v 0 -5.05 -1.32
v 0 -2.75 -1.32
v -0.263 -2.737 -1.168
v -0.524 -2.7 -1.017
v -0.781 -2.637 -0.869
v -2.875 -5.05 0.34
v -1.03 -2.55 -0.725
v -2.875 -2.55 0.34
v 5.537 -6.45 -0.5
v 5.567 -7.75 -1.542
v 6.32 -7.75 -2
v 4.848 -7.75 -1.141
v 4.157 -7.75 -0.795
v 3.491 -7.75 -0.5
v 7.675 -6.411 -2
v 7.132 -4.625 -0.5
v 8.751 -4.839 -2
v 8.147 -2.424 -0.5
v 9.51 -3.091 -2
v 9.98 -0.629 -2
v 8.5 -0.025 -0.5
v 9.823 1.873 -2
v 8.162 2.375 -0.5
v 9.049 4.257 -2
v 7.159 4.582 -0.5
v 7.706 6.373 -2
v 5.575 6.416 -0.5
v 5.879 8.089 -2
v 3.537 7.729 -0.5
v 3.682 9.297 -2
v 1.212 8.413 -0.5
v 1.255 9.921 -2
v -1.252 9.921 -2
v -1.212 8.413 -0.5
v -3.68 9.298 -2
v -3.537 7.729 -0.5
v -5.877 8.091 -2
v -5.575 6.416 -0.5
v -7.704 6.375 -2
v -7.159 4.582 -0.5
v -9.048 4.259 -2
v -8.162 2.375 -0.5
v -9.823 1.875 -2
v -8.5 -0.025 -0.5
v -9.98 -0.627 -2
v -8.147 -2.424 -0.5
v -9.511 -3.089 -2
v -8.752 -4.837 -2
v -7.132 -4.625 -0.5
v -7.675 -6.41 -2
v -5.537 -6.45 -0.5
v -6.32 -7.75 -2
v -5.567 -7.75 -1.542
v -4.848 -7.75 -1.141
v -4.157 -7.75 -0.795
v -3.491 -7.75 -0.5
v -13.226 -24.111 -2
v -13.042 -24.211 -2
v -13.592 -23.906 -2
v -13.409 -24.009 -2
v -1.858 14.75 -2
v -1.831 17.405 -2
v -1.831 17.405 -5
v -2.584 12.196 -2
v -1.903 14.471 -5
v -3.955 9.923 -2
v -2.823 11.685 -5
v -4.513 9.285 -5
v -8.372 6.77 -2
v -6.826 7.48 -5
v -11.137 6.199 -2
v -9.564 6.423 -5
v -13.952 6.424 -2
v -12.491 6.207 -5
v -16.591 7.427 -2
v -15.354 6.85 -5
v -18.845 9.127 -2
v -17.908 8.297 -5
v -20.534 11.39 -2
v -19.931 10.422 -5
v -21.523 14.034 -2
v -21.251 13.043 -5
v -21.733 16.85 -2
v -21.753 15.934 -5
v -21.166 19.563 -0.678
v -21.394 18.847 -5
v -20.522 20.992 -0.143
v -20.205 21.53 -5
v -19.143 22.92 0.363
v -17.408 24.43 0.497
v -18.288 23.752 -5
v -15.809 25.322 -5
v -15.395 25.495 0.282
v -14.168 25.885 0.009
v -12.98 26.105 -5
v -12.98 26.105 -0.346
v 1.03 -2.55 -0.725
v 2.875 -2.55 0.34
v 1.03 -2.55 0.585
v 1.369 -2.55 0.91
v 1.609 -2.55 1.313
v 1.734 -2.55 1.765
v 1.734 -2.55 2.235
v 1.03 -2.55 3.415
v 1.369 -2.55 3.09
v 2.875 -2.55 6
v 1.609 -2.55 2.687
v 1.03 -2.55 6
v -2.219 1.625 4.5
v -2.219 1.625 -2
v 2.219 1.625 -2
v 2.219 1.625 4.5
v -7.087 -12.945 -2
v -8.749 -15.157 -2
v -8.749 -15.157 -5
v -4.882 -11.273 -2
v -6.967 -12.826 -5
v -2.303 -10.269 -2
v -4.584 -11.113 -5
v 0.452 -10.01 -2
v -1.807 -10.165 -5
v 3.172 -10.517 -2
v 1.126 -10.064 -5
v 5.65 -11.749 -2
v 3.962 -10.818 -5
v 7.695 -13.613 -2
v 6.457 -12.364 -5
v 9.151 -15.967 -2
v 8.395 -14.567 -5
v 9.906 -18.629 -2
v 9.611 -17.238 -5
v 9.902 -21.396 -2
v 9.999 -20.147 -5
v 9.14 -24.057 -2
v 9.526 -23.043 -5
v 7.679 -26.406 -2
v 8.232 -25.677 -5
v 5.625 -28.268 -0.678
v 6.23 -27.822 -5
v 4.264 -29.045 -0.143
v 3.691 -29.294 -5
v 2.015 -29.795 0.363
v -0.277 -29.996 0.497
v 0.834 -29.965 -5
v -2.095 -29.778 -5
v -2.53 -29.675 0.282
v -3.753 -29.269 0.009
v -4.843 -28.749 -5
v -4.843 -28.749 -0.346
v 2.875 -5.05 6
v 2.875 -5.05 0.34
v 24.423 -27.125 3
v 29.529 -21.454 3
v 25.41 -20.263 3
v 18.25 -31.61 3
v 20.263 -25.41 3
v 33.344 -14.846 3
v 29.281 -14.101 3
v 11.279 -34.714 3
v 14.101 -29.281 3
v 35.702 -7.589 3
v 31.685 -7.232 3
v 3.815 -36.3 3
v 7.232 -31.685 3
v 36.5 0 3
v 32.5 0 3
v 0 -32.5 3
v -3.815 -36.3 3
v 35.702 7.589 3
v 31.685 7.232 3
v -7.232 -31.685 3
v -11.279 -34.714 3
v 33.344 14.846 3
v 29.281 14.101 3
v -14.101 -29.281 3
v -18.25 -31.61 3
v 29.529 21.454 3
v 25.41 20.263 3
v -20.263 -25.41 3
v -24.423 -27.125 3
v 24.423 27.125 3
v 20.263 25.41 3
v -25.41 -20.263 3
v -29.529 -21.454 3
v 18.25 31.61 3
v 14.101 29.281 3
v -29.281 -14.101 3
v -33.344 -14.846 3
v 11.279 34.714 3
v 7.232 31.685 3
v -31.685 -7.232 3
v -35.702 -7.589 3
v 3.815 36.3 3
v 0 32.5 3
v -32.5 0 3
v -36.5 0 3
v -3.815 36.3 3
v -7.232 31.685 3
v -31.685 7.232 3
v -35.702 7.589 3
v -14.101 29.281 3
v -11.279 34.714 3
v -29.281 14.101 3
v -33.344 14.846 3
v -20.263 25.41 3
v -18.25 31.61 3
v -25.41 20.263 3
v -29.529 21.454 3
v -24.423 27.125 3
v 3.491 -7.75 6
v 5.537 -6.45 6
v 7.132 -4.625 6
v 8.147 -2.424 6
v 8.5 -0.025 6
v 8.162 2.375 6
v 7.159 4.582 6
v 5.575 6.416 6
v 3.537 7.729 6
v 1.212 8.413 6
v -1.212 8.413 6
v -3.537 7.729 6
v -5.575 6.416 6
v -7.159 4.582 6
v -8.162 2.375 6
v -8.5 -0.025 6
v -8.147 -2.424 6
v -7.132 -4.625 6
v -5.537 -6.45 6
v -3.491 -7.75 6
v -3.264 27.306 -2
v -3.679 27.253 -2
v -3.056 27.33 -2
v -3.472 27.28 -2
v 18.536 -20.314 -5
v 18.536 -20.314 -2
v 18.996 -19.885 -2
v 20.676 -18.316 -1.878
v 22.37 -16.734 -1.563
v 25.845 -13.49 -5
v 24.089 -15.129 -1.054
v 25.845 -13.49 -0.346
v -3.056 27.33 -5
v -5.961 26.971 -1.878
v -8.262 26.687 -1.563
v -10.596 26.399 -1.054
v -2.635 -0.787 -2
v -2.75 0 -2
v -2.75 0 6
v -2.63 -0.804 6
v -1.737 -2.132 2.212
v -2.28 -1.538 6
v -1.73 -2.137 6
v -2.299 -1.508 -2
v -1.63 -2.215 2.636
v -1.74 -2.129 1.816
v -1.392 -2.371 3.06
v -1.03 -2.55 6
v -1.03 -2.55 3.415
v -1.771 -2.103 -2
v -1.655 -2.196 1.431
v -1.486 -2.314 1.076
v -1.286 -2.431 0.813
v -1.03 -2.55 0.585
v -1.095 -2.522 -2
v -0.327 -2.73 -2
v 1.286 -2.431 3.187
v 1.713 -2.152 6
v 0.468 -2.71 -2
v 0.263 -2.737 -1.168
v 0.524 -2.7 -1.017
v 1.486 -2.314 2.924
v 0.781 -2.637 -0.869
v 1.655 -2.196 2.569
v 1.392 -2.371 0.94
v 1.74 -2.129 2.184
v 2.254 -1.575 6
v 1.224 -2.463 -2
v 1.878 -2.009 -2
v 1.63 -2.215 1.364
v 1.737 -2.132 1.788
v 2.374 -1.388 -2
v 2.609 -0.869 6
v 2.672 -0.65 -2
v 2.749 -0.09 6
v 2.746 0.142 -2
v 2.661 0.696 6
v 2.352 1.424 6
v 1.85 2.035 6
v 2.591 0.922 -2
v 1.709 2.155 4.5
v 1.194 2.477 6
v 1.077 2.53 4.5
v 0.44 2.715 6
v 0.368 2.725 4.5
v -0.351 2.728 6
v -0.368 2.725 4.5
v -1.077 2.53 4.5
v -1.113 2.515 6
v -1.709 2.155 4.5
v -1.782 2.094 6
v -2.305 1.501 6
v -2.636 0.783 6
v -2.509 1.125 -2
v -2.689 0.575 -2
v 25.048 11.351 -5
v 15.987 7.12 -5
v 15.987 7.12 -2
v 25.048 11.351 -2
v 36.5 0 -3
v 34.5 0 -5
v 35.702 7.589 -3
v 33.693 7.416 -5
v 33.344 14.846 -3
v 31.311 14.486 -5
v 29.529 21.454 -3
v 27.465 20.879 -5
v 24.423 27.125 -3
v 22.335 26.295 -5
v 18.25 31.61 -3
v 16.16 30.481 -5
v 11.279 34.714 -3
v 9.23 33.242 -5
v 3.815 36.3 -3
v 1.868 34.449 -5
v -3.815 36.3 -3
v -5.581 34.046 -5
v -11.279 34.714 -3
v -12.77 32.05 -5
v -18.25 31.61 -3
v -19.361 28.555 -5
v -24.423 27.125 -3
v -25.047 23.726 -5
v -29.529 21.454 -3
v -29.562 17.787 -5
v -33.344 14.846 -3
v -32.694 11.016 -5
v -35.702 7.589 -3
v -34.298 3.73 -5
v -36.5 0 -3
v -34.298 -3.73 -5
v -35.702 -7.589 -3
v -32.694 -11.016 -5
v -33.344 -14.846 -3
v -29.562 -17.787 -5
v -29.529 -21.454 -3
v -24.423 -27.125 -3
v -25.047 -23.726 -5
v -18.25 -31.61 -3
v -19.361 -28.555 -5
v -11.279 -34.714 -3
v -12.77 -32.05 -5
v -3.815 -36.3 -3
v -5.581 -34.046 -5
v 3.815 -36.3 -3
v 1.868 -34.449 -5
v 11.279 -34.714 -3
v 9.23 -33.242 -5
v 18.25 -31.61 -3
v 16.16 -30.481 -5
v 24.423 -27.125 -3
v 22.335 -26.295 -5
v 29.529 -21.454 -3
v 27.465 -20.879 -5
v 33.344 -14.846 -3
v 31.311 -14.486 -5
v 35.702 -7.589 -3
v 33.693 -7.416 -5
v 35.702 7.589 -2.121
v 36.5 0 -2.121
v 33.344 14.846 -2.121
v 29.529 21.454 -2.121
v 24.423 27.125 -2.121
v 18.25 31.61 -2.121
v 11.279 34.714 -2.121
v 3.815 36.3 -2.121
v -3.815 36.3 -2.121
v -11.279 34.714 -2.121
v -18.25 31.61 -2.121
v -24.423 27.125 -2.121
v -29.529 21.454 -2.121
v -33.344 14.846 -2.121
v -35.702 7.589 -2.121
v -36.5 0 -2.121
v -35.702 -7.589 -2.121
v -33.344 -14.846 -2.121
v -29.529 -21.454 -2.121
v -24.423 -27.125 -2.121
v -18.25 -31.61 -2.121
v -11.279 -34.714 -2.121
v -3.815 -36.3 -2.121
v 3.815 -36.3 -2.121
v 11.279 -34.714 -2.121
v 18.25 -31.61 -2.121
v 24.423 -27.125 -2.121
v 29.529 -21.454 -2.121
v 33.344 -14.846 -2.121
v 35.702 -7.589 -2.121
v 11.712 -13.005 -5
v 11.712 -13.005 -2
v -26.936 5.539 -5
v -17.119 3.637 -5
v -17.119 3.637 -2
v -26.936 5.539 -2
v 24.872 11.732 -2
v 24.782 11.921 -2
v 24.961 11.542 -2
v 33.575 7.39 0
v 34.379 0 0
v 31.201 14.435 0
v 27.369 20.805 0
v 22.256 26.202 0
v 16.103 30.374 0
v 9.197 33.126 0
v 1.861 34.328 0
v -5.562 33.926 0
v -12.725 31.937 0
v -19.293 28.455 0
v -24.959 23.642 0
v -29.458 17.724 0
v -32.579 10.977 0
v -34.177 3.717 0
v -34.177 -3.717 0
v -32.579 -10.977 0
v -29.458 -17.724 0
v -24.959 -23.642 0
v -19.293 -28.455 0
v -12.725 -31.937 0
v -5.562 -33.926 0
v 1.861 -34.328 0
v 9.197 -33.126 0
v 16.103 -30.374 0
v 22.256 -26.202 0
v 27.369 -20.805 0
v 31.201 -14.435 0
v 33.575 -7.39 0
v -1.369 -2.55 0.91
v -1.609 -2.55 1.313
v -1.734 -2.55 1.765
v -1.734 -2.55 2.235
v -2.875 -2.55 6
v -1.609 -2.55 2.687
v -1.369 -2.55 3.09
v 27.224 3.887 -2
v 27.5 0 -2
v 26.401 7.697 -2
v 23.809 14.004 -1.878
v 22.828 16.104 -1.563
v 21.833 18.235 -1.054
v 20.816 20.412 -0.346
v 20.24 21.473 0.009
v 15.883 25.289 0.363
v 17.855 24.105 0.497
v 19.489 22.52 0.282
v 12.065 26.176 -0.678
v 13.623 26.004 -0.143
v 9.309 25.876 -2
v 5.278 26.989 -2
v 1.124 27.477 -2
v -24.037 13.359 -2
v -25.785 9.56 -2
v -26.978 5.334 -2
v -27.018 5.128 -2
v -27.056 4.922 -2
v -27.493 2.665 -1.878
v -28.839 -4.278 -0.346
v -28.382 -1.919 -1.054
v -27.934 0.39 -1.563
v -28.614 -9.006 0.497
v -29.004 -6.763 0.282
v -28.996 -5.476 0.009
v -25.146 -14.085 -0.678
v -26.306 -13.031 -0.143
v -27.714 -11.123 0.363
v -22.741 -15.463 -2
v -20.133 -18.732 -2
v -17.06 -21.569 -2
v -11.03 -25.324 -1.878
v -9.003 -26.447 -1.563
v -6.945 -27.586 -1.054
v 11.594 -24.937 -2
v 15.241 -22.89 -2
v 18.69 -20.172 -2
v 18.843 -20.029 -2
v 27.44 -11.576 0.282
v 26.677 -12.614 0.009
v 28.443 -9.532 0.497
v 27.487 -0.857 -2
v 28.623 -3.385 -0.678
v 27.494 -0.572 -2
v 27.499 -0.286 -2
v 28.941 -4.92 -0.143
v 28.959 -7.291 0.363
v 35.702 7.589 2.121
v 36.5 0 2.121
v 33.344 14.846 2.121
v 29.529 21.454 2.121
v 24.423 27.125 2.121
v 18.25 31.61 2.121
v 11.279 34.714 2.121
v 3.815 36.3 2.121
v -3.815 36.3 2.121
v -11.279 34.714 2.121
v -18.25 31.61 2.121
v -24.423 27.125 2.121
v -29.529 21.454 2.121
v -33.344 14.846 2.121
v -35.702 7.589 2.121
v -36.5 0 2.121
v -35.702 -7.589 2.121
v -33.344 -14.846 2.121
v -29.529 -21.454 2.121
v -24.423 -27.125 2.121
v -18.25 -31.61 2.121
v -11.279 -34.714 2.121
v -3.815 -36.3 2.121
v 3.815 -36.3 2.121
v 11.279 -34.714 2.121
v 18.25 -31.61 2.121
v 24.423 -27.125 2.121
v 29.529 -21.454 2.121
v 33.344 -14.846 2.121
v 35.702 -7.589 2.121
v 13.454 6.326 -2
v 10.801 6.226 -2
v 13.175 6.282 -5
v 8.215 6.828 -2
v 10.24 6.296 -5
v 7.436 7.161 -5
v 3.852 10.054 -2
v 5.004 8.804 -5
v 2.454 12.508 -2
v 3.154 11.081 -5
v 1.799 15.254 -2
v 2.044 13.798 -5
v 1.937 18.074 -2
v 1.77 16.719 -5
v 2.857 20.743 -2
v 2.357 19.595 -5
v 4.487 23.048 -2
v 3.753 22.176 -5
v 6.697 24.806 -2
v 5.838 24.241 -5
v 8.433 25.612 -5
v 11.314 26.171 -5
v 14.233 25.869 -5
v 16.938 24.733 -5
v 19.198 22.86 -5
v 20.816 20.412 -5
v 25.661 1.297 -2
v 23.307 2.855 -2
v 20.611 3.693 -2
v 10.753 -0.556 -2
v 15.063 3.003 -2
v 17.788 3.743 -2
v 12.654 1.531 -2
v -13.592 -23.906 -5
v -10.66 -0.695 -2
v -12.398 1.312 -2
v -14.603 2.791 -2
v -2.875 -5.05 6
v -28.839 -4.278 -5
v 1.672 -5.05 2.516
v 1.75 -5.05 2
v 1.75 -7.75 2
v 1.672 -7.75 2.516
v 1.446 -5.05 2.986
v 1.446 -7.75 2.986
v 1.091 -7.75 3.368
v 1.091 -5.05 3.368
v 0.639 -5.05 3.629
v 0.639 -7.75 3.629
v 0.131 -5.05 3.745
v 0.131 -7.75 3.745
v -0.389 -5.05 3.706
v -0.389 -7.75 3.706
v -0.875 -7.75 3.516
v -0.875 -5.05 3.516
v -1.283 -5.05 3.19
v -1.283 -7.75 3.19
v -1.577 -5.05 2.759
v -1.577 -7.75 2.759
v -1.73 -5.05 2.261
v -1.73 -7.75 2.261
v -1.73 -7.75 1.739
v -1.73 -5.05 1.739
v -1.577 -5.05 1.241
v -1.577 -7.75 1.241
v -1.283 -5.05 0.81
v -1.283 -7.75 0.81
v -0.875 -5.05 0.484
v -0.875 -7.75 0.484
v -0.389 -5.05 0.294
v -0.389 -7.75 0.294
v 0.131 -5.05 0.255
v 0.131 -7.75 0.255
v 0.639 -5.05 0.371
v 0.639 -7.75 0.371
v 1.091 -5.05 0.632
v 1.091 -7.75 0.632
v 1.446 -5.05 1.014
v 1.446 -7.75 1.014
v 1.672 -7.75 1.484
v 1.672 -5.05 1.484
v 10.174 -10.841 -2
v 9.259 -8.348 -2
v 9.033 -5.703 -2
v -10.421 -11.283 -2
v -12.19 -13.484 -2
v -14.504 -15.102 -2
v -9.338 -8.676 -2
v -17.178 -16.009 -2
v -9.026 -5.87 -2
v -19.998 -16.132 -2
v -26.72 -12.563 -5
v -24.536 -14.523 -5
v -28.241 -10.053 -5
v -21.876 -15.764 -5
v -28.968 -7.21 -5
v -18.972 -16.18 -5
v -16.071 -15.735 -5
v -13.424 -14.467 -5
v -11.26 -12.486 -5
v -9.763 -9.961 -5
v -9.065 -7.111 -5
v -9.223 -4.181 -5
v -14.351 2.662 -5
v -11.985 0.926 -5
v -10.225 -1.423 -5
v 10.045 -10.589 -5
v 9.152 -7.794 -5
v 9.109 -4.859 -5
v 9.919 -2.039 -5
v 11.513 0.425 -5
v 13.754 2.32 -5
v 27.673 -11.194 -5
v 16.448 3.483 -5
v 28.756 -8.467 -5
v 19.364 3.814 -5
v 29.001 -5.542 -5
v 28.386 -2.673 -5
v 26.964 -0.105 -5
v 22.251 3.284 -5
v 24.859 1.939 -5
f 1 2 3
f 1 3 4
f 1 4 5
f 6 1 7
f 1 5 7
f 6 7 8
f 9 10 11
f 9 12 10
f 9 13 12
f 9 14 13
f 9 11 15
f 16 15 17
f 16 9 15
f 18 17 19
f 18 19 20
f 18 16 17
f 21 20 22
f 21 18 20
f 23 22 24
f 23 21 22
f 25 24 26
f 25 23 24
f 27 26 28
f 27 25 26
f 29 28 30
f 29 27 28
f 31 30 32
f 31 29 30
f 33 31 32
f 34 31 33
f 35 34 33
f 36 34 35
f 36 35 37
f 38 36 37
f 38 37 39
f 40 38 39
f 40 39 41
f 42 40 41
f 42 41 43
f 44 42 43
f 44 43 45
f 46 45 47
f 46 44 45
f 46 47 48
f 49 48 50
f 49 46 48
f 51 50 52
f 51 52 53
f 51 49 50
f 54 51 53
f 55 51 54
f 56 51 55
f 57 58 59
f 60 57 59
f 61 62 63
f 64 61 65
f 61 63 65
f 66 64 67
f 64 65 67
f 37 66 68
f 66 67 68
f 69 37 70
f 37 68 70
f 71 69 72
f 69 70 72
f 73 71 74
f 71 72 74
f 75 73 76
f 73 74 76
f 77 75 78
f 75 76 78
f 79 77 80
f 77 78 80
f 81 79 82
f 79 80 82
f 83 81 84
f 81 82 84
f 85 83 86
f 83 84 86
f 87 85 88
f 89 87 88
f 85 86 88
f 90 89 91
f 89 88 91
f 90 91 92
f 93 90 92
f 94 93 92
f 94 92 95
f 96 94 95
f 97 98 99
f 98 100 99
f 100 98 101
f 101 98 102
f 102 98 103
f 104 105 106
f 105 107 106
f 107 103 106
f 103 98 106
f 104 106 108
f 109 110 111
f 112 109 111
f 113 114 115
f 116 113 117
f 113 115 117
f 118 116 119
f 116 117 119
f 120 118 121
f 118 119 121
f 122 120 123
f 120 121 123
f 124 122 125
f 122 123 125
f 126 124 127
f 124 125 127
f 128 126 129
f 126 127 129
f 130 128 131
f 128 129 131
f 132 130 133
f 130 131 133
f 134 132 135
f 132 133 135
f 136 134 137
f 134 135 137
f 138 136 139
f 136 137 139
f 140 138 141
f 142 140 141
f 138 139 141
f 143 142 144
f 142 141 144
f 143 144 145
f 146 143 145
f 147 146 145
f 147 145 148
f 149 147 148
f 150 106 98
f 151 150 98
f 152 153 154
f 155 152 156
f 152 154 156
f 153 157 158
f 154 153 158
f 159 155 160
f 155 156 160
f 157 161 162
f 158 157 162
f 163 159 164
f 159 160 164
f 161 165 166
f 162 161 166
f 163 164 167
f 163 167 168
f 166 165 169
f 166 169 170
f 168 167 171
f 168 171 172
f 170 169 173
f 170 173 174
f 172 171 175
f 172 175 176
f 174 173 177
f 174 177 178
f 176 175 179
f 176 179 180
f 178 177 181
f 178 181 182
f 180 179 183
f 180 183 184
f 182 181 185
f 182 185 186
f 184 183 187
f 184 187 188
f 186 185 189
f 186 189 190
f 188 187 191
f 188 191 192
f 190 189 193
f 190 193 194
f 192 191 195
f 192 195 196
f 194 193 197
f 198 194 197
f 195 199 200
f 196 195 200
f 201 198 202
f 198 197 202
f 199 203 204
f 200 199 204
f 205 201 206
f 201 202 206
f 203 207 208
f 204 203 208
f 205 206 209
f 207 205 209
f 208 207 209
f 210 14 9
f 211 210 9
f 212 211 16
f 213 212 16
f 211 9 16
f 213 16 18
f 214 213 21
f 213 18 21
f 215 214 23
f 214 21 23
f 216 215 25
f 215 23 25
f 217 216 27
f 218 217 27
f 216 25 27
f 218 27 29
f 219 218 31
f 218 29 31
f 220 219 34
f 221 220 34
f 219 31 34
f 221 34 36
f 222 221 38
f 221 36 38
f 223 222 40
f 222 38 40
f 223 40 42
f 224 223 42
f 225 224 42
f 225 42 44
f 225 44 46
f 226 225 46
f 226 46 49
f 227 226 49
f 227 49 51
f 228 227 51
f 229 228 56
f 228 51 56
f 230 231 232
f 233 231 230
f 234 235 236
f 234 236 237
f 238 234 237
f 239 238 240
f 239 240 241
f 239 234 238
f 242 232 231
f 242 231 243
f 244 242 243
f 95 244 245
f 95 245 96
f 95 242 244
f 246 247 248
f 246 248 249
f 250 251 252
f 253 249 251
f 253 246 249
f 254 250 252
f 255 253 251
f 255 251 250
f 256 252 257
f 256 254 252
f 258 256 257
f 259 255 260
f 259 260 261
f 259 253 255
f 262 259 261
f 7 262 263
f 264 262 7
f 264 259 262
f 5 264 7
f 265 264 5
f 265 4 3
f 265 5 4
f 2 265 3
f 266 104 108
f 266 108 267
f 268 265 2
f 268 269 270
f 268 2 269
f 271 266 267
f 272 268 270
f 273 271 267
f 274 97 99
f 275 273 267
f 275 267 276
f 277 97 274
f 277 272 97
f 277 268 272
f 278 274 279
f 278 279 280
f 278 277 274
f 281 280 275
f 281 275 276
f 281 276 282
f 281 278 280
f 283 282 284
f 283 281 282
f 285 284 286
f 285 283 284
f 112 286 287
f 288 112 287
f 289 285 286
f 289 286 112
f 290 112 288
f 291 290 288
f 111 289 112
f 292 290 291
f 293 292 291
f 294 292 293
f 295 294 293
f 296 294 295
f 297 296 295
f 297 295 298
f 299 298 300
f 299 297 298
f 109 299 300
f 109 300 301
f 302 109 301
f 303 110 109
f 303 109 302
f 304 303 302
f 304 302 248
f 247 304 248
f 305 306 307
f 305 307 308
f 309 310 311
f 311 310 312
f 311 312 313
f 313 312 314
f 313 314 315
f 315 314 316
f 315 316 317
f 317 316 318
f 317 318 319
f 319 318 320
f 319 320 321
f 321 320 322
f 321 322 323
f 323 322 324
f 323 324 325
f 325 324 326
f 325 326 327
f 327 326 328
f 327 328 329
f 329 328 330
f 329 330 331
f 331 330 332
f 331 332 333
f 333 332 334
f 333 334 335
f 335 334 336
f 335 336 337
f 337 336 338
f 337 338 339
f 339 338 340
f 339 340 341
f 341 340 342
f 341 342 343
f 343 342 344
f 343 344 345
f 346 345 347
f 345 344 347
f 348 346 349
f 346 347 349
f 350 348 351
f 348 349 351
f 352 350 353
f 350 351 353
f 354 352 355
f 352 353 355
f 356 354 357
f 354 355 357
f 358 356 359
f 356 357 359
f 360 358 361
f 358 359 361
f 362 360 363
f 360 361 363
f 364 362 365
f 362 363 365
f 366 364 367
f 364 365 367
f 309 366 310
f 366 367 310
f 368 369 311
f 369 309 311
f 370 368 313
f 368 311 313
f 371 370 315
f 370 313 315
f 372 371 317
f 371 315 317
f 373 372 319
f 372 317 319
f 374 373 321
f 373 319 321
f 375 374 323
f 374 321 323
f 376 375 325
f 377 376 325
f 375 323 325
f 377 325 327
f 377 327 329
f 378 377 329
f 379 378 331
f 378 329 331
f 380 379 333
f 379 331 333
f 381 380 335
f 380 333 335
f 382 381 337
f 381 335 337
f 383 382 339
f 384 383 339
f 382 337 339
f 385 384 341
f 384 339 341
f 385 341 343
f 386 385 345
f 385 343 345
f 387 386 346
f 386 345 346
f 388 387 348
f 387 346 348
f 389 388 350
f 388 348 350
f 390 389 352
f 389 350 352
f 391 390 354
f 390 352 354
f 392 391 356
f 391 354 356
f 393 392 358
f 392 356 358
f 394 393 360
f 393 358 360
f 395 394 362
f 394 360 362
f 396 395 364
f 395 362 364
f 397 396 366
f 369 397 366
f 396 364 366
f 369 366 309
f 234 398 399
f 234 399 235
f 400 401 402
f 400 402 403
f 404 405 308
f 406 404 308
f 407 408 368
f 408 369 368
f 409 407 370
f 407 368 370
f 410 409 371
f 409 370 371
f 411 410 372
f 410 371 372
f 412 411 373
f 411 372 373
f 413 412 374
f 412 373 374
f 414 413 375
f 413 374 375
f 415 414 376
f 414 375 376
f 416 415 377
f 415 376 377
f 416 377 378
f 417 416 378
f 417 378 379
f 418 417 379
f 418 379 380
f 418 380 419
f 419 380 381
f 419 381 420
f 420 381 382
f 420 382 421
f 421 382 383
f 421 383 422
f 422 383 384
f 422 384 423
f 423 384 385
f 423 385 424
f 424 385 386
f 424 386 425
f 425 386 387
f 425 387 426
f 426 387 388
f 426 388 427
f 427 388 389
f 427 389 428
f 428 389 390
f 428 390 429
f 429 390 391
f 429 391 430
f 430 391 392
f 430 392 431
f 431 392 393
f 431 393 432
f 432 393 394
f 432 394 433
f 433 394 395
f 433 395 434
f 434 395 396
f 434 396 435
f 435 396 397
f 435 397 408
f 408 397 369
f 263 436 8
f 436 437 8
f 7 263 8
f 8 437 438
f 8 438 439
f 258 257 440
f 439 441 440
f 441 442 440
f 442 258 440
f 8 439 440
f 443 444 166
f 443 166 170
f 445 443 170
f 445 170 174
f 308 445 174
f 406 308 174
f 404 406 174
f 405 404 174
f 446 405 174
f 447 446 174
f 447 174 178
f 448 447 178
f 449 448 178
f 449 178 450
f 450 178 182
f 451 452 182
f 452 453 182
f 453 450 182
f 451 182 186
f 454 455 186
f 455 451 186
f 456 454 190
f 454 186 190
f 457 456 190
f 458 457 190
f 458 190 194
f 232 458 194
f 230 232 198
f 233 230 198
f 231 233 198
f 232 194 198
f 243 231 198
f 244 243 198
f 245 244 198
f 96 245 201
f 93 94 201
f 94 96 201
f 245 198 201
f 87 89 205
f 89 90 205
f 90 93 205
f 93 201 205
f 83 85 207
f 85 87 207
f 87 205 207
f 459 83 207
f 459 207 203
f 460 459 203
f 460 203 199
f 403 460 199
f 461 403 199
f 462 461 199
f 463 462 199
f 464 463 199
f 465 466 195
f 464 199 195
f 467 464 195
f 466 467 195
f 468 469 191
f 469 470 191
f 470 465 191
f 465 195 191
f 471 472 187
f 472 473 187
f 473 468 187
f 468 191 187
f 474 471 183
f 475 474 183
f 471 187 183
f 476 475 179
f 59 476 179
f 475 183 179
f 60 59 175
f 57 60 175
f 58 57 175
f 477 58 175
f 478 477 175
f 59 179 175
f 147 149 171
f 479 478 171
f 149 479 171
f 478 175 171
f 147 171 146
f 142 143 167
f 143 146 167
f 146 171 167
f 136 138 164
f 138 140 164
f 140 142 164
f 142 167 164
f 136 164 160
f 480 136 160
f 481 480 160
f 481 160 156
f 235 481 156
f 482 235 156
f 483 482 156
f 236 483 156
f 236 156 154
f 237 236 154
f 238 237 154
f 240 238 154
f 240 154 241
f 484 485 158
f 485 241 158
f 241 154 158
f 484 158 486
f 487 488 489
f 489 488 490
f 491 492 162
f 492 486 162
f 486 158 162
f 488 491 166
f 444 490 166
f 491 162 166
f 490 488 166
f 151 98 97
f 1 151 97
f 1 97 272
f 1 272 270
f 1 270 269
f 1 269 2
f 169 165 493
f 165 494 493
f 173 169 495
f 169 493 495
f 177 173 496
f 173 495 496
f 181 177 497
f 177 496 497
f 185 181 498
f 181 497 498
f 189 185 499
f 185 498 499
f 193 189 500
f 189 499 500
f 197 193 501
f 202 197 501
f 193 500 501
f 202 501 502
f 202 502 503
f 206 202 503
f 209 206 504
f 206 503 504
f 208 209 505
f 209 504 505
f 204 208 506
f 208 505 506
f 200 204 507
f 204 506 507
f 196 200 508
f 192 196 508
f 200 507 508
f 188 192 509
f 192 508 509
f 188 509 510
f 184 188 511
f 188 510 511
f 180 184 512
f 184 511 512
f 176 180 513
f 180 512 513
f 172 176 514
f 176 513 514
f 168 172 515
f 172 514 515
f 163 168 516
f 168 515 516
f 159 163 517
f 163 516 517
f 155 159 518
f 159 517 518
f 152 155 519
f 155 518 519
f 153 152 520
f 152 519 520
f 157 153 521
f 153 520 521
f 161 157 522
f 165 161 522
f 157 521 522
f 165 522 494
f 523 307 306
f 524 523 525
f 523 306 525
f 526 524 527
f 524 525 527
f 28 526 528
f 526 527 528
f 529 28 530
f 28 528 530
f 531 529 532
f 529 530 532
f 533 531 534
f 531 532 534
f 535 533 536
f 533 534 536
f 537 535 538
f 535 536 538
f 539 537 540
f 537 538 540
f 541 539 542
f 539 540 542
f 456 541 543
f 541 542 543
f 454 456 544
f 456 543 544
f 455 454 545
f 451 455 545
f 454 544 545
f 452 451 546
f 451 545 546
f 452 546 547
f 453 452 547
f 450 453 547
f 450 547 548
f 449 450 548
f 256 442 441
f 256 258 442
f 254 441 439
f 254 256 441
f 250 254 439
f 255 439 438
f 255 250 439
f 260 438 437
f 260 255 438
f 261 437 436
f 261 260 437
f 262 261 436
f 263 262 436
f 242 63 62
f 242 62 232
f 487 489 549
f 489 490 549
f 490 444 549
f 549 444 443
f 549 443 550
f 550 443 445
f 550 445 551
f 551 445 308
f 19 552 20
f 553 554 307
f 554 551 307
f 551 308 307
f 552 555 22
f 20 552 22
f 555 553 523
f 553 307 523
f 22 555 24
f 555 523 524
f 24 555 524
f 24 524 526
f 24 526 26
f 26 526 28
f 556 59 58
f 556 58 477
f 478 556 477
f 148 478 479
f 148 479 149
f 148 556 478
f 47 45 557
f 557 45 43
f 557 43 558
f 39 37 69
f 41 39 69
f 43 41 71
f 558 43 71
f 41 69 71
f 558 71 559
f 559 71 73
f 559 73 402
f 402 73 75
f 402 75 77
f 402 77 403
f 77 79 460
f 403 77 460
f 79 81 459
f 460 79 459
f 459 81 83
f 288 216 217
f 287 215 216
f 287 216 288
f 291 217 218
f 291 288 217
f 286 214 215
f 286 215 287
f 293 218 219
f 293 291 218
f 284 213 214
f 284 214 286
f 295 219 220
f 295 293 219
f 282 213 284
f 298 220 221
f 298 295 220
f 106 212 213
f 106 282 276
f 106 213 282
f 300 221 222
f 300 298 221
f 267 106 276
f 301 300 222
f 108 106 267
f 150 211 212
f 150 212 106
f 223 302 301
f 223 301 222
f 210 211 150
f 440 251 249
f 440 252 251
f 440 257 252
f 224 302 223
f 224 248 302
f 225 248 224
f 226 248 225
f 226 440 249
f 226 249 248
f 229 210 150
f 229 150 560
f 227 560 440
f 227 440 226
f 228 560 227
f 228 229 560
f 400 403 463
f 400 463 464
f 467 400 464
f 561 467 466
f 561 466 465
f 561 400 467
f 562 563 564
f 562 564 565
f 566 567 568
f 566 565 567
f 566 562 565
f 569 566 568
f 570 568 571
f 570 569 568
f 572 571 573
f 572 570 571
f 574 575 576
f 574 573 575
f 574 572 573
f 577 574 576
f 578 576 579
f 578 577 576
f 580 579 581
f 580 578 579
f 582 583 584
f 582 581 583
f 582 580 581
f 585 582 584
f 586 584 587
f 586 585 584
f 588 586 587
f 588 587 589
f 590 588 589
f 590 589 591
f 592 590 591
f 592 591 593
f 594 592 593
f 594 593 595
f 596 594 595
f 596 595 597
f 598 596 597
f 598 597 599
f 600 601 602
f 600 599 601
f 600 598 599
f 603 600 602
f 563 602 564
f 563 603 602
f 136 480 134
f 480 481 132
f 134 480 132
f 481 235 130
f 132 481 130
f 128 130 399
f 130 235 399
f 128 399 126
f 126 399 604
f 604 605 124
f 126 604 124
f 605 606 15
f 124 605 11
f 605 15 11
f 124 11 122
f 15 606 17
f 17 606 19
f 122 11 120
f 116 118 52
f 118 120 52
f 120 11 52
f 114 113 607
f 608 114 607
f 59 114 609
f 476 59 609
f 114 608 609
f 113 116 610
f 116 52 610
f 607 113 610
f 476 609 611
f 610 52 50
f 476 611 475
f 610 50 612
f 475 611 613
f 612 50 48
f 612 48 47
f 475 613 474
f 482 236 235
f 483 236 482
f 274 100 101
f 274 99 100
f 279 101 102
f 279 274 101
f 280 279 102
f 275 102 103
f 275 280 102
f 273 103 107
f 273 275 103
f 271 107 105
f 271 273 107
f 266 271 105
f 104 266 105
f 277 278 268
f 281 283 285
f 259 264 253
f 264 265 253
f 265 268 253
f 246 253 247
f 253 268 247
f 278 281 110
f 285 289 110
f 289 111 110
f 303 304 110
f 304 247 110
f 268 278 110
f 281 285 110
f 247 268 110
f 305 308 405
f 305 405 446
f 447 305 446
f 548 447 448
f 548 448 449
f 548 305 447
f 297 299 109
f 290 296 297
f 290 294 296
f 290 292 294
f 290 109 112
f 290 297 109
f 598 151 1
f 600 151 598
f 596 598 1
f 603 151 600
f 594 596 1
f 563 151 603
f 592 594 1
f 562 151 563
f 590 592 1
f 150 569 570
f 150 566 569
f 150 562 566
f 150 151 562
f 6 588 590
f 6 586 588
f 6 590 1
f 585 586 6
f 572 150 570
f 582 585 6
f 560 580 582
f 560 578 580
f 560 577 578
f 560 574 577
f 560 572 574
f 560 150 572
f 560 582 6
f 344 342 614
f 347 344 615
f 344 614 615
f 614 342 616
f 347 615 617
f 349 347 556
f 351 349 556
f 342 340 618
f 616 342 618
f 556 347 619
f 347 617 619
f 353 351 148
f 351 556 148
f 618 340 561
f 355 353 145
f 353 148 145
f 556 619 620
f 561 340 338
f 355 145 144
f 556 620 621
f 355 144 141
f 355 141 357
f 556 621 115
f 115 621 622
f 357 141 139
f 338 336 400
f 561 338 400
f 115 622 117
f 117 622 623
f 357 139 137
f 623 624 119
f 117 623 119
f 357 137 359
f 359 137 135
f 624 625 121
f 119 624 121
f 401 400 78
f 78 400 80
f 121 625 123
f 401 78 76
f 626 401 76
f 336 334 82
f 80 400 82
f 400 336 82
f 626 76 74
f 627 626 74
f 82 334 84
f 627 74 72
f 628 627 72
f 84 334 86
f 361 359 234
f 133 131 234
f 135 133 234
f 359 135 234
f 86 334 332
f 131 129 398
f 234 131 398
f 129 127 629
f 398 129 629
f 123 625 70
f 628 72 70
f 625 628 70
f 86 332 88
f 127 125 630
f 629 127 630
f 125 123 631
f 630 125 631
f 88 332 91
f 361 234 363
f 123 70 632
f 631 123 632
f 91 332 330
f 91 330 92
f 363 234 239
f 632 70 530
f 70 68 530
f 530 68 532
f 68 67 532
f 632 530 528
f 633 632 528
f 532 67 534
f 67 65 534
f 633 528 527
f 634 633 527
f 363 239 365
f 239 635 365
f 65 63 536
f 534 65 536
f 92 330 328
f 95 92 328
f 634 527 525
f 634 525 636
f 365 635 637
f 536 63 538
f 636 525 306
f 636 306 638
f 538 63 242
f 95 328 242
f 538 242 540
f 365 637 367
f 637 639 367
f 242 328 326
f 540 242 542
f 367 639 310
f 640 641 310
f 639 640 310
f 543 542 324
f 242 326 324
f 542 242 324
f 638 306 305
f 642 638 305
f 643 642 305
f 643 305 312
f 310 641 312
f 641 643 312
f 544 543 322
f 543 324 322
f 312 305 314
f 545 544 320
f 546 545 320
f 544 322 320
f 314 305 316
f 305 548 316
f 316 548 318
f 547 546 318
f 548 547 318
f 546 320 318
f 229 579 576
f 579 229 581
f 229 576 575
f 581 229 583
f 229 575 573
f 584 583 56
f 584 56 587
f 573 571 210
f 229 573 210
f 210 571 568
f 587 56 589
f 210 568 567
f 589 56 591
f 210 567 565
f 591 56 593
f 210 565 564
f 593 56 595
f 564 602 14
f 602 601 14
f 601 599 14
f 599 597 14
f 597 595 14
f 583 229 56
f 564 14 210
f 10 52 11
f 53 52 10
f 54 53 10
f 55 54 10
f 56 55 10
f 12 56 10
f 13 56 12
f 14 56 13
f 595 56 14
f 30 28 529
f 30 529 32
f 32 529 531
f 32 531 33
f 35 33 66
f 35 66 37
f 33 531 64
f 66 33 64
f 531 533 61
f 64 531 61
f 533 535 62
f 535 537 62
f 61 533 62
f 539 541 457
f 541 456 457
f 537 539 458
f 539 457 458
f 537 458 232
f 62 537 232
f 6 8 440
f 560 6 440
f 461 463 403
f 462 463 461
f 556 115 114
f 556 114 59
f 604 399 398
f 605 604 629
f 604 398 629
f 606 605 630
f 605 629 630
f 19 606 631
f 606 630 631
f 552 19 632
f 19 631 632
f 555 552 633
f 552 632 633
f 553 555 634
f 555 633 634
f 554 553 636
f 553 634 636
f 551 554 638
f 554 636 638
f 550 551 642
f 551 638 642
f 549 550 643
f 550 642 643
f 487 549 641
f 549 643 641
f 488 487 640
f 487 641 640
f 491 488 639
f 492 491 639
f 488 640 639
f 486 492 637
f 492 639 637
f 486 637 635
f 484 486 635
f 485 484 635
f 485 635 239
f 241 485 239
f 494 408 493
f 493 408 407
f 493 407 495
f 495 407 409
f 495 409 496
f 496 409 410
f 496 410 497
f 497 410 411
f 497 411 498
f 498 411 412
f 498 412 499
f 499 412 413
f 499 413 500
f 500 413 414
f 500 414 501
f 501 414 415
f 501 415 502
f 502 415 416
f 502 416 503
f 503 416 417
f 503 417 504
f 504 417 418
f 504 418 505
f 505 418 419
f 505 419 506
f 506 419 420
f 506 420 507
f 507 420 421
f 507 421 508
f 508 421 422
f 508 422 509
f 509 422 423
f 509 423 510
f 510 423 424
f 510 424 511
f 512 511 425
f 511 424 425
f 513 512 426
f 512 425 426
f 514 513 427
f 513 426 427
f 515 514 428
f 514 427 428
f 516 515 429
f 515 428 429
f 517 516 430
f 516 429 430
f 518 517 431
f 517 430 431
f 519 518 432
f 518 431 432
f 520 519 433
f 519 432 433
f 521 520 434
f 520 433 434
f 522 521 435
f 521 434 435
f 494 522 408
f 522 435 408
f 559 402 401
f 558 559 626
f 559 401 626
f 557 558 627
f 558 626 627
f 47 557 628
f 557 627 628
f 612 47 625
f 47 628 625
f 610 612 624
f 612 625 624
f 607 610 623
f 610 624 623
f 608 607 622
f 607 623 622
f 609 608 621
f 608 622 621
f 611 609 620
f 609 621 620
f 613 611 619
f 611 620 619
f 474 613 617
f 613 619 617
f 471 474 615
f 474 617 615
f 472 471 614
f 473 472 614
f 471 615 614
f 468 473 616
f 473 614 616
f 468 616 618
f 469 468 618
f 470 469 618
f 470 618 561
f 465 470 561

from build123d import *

# Parameters (mm, degrees)
PAD_DEPTH              = 2.5
CYLINDER001_R          = 1.75
CYLINDER001_DEPTH      = 10
CYLINDER001_ROLL_ANGLE = 90
BOX_W                  = 6
BOX_H                  = 3
BOX_DEPTH              = 7.5
SKETCH003_R            = 2.75
PAD001_DEPTH           = 8
CHAMFER_SIZE           = 1.5
POCKET_DEPTH           = 218.644926
POLARPATTERN_COUNT     = 5


with BuildPart() as captive_nut:
    # Sketch002 → Pad (new body)
    with BuildSketch(Plane.XZ):
        Polygon((-2.875, 5), (2.875, 5), (2.875, -1.659882), (0, -3.319764), (-2.875, -1.659882), align=None)
    extrude(amount=PAD_DEPTH)


with BuildPart() as captive_nut_1:
    # Clone placement: moved
    add(captive_nut.part.moved(Location((0, -3.75, 2))))


with BuildPart() as captive_nut_screw_fusion:
    # Cylinder001 → Cylinder001 (new body)
    with BuildSketch(Plane.XY):
        Circle(CYLINDER001_R)
    extrude(amount=CYLINDER001_DEPTH)


with BuildPart() as captive_nut_screw_fusion_1:
    # Cylinder001 roll: moved
    add(captive_nut_screw_fusion.part.rotate(Axis((0, 0, 0), (1, 0, 0)), CYLINDER001_ROLL_ANGLE))


with BuildPart() as captive_nut_screw_fusion_2:
    # Cylinder001 placement: moved
    add(captive_nut_screw_fusion_1.part.moved(Location((0, 0, 2))))

    # Fusion: union captive-nut
    add(captive_nut_1.part)


with BuildPart() as captive_nut_screw_fusion_3:
    # Fusion placement: moved
    add(captive_nut_screw_fusion_2.part.moved(Location((0, 1.2, 0))))


with BuildPart() as shaft_recess_cube:
    # Box → Box (new body)
    with BuildSketch(Plane(origin=(-3, 1.625, -3), x_dir=(1, 0, 0), z_dir=(0, 0, 1))):
        with Locations((3, 1.5)):
            Rectangle(BOX_W, BOX_H)
    extrude(amount=BOX_DEPTH)


with BuildPart() as wheel_r:
    # Sketch → Revolution (revolve)
    with BuildSketch(Plane.XZ):
        Polygon((0, -2), (27.5, -2), (32.5, 3), (36.5, 3), (36.5, 2.12132), (34.37868, 0), (36.5, -2.12132), (36.5, -3), (34.5, -5), (0, -5), align=None)
    revolve(axis=Axis((0, 0, 0), (0, 0, 1)))

    # Sketch003 → Pad001 (new body)
    with BuildSketch(Plane(origin=(0, 0, -2), x_dir=(-1, 0, 0), z_dir=(0, 0, 1))):
        with BuildLine():
            ThreePointArc((-3.49106, 7.75), (0, -8.5), (3.49106, 7.75))
            Line((3.49106, 7.75), (-3.49106, 7.75))
        make_face()
        Circle(SKETCH003_R, mode=Mode.SUBTRACT)
    extrude(amount=PAD001_DEPTH)

    # Fusion001: union shaft-recess-cube
    add(shaft_recess_cube.part)

    # Cut: cut captive-nut-screw-fusion
    add(captive_nut_screw_fusion_3.part, mode=Mode.SUBTRACT)

    # Chamfer
    chamfer_edges = [wheel_r.edges().sort_by_distance(p)[0] for p in [
        (0, 8.5, -2),
    ]]
    chamfer(chamfer_edges, length=CHAMFER_SIZE)

    # Sketch004 → Pocket (cut, through all)
    with BuildSketch(Plane(origin=(0, 0, -5), x_dir=(1, 0, 0), z_dir=(0, 0, -1))):
        with BuildLine():
            ThreePointArc((-8.749102, 15.157148), (9.610963, 17.237864), (-4.842852, 28.749102))
            Line((-13.591954, 23.90625), (-4.842852, 28.749102))
            Line((-8.749102, 15.157148), (-13.591954, 23.90625))
        make_face()
    pocket = extrude(amount=-POCKET_DEPTH, mode=Mode.SUBTRACT)

    # PolarPattern: Pocket ×5 about axis
    polarpattern_axis = Axis((0, 0, -5), (0, 0, -1))
    for i in range(1, POLARPATTERN_COUNT):
        add(pocket.rotate(polarpattern_axis, i * 360 / POLARPATTERN_COUNT), mode=Mode.SUBTRACT)


solid = wheel_r.part
